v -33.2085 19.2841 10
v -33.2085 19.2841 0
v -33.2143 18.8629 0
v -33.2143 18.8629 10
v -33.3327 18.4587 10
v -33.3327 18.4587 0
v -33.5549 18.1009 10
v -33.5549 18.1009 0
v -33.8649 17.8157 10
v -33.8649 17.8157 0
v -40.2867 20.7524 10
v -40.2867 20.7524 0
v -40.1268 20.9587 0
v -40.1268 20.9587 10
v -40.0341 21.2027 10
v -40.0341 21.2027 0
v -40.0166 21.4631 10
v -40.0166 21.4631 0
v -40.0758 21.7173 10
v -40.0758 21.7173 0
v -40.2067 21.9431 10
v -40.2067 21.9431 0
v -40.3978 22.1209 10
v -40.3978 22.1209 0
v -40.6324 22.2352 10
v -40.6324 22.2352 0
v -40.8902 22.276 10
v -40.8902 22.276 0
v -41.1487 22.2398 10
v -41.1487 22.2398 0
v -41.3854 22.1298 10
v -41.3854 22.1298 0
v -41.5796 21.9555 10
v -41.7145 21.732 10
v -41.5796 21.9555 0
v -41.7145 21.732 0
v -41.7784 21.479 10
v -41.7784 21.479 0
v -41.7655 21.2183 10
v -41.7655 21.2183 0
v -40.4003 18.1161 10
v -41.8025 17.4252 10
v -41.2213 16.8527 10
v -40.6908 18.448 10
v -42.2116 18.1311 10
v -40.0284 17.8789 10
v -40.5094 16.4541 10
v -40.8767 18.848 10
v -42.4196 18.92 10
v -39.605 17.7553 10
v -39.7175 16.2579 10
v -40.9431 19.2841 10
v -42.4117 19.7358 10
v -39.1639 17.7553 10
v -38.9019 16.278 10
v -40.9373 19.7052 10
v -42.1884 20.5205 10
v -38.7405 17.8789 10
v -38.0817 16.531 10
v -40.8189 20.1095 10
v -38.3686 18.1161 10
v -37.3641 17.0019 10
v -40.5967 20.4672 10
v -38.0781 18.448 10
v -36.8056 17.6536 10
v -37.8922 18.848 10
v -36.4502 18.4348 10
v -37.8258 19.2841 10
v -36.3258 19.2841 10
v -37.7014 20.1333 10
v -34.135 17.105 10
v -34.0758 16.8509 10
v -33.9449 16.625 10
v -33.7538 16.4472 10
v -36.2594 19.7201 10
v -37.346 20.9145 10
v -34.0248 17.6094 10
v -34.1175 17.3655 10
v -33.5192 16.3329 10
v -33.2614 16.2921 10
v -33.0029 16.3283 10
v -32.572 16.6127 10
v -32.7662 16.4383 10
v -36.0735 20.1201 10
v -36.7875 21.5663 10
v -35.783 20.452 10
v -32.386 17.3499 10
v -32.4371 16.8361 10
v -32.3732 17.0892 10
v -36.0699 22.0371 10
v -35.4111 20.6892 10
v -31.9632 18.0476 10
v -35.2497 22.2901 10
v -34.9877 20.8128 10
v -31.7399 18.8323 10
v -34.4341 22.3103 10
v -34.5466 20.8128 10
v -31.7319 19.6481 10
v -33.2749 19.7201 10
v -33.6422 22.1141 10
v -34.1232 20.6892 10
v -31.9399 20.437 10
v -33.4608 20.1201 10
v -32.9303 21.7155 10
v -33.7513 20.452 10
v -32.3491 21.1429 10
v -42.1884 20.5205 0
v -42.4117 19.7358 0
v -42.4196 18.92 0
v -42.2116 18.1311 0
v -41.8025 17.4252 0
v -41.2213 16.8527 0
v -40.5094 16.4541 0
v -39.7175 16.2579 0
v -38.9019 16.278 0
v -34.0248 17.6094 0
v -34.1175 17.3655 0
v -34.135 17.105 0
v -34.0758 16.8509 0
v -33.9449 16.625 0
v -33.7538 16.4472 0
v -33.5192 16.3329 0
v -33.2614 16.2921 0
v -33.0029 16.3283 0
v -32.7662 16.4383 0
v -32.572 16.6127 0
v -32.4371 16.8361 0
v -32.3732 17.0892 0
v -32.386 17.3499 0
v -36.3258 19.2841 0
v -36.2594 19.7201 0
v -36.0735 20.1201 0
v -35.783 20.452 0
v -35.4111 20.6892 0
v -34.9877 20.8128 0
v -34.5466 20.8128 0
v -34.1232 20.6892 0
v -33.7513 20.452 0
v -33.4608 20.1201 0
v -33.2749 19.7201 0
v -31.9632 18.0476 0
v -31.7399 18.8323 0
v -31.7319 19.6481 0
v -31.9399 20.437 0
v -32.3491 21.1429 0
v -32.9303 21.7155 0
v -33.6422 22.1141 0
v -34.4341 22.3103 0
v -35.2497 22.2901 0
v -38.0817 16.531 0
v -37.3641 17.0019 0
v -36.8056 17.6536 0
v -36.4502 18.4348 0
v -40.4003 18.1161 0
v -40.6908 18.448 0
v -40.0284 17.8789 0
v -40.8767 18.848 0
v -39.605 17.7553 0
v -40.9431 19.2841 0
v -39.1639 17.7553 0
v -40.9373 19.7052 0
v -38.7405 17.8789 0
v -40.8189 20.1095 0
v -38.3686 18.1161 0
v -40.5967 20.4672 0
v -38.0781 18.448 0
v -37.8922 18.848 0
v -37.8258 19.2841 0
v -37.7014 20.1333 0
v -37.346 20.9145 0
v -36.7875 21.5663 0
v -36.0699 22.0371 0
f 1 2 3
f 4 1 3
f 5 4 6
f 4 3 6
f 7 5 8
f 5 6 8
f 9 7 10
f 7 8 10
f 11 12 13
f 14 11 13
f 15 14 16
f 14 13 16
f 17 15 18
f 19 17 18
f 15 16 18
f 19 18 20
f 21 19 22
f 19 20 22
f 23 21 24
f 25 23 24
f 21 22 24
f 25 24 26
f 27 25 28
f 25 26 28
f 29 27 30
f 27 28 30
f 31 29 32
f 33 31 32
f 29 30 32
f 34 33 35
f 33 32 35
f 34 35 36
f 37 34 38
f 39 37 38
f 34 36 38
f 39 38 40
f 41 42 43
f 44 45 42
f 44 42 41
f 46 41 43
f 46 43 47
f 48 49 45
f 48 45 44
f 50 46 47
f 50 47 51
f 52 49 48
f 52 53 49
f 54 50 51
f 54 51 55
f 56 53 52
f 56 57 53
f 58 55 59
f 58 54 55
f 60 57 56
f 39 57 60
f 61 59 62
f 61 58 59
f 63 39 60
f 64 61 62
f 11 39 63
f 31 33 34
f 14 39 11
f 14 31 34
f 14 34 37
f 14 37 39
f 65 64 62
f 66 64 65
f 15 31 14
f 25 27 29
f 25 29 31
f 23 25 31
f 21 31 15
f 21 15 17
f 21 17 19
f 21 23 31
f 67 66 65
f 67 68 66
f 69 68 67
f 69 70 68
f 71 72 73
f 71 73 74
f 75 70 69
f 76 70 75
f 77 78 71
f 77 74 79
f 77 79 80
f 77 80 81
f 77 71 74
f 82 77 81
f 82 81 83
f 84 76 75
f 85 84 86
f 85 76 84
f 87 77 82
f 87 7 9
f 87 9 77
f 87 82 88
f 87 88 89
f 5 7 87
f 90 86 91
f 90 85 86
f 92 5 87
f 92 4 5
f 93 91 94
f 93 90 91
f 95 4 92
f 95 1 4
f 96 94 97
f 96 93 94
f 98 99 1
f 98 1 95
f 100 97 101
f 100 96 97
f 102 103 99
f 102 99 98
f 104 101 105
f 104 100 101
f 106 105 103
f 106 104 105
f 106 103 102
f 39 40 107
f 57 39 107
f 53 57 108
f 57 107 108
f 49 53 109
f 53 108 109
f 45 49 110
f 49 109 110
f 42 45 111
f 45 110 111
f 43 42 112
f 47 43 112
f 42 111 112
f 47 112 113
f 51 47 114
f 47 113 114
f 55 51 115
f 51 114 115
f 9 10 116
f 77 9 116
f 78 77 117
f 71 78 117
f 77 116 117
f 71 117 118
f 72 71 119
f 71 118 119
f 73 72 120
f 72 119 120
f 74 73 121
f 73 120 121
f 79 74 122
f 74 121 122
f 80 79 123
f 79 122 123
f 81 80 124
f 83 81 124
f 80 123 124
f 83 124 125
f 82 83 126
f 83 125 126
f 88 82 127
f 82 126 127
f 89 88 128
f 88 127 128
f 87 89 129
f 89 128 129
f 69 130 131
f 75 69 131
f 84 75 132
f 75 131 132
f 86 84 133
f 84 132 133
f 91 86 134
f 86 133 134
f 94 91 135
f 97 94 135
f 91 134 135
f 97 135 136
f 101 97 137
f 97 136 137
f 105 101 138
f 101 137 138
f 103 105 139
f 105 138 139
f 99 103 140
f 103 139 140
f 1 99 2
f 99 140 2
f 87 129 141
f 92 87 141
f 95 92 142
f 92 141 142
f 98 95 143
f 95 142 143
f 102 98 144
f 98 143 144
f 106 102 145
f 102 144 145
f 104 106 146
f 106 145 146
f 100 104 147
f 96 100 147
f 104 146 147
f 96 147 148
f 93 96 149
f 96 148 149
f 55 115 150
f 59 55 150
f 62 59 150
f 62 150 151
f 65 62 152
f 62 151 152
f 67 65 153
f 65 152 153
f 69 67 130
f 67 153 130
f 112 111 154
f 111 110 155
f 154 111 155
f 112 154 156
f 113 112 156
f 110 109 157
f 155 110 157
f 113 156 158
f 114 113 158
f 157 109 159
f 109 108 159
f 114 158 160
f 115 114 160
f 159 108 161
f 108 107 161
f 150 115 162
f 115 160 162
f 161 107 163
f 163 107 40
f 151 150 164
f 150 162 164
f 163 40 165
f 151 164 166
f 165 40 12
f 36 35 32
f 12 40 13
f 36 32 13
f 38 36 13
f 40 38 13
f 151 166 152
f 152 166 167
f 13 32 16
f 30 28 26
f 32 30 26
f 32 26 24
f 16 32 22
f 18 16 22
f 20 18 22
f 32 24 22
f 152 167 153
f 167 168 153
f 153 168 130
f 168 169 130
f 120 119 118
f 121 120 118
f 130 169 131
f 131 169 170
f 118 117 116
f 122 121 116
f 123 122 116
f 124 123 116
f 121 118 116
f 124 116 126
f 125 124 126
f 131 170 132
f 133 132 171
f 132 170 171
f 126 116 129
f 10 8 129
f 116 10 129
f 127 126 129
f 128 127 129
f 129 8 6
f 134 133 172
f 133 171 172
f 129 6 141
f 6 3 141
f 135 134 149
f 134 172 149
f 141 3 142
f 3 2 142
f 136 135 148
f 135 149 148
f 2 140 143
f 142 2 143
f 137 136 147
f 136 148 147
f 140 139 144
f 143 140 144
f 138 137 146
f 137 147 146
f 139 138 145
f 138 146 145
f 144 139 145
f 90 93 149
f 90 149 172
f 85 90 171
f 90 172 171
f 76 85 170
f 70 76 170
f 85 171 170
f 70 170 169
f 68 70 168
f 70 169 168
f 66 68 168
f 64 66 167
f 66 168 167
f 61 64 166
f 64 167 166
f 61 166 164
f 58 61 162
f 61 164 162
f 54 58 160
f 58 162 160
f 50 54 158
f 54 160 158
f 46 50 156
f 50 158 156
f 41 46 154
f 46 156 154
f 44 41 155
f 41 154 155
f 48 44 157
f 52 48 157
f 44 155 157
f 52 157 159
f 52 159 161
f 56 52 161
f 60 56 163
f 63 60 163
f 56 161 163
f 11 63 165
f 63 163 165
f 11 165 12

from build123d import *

# Parameters (mm, degrees)
F1_DEPTH = 10


with BuildPart() as f1:
    # F0 (on Top) → F1 (new body)
    with BuildSketch(Plane.XY):
        with BuildLine():
            ThreePointArc((-38.901878, 16.278005), (-37.061914, 17.308061), (-36.325796, 19.284071))
            Line((-36.325796, 19.284071), (-37.825796, 19.284071))
            ThreePointArc((-37.825796, 19.284071), (-39.384453, 17.739665), (-40.943111, 19.284071))
            ThreePointArc((-40.943111, 19.284071), (-40.818937, 20.109457), (-40.286706, 20.752427))
            ThreePointArc((-40.286706, 20.752427), (-40.632409, 22.235194), (-41.765545, 21.218282))
            ThreePointArc((-41.765545, 21.218282), (-42.03071, 17.764466), (-38.901878, 16.278005))
        make_face()
        with BuildLine():
            ThreePointArc((-36.325796, 19.284071), (-34.767138, 20.828477), (-33.208481, 19.284071))
            ThreePointArc((-33.208481, 19.284071), (-33.332654, 18.458685), (-33.864885, 17.815715))
            ThreePointArc((-33.864885, 17.815715), (-33.519182, 16.332948), (-32.386046, 17.34986))
            ThreePointArc((-32.386046, 17.34986), (-32.120882, 20.803676), (-35.249713, 22.290136))
            ThreePointArc((-35.249713, 22.290136), (-37.089678, 21.26008), (-37.825796, 19.284071))
            Line((-37.825796, 19.284071), (-36.325796, 19.284071))
        make_face()
    extrude(amount=F1_DEPTH)


solid = f1.part
